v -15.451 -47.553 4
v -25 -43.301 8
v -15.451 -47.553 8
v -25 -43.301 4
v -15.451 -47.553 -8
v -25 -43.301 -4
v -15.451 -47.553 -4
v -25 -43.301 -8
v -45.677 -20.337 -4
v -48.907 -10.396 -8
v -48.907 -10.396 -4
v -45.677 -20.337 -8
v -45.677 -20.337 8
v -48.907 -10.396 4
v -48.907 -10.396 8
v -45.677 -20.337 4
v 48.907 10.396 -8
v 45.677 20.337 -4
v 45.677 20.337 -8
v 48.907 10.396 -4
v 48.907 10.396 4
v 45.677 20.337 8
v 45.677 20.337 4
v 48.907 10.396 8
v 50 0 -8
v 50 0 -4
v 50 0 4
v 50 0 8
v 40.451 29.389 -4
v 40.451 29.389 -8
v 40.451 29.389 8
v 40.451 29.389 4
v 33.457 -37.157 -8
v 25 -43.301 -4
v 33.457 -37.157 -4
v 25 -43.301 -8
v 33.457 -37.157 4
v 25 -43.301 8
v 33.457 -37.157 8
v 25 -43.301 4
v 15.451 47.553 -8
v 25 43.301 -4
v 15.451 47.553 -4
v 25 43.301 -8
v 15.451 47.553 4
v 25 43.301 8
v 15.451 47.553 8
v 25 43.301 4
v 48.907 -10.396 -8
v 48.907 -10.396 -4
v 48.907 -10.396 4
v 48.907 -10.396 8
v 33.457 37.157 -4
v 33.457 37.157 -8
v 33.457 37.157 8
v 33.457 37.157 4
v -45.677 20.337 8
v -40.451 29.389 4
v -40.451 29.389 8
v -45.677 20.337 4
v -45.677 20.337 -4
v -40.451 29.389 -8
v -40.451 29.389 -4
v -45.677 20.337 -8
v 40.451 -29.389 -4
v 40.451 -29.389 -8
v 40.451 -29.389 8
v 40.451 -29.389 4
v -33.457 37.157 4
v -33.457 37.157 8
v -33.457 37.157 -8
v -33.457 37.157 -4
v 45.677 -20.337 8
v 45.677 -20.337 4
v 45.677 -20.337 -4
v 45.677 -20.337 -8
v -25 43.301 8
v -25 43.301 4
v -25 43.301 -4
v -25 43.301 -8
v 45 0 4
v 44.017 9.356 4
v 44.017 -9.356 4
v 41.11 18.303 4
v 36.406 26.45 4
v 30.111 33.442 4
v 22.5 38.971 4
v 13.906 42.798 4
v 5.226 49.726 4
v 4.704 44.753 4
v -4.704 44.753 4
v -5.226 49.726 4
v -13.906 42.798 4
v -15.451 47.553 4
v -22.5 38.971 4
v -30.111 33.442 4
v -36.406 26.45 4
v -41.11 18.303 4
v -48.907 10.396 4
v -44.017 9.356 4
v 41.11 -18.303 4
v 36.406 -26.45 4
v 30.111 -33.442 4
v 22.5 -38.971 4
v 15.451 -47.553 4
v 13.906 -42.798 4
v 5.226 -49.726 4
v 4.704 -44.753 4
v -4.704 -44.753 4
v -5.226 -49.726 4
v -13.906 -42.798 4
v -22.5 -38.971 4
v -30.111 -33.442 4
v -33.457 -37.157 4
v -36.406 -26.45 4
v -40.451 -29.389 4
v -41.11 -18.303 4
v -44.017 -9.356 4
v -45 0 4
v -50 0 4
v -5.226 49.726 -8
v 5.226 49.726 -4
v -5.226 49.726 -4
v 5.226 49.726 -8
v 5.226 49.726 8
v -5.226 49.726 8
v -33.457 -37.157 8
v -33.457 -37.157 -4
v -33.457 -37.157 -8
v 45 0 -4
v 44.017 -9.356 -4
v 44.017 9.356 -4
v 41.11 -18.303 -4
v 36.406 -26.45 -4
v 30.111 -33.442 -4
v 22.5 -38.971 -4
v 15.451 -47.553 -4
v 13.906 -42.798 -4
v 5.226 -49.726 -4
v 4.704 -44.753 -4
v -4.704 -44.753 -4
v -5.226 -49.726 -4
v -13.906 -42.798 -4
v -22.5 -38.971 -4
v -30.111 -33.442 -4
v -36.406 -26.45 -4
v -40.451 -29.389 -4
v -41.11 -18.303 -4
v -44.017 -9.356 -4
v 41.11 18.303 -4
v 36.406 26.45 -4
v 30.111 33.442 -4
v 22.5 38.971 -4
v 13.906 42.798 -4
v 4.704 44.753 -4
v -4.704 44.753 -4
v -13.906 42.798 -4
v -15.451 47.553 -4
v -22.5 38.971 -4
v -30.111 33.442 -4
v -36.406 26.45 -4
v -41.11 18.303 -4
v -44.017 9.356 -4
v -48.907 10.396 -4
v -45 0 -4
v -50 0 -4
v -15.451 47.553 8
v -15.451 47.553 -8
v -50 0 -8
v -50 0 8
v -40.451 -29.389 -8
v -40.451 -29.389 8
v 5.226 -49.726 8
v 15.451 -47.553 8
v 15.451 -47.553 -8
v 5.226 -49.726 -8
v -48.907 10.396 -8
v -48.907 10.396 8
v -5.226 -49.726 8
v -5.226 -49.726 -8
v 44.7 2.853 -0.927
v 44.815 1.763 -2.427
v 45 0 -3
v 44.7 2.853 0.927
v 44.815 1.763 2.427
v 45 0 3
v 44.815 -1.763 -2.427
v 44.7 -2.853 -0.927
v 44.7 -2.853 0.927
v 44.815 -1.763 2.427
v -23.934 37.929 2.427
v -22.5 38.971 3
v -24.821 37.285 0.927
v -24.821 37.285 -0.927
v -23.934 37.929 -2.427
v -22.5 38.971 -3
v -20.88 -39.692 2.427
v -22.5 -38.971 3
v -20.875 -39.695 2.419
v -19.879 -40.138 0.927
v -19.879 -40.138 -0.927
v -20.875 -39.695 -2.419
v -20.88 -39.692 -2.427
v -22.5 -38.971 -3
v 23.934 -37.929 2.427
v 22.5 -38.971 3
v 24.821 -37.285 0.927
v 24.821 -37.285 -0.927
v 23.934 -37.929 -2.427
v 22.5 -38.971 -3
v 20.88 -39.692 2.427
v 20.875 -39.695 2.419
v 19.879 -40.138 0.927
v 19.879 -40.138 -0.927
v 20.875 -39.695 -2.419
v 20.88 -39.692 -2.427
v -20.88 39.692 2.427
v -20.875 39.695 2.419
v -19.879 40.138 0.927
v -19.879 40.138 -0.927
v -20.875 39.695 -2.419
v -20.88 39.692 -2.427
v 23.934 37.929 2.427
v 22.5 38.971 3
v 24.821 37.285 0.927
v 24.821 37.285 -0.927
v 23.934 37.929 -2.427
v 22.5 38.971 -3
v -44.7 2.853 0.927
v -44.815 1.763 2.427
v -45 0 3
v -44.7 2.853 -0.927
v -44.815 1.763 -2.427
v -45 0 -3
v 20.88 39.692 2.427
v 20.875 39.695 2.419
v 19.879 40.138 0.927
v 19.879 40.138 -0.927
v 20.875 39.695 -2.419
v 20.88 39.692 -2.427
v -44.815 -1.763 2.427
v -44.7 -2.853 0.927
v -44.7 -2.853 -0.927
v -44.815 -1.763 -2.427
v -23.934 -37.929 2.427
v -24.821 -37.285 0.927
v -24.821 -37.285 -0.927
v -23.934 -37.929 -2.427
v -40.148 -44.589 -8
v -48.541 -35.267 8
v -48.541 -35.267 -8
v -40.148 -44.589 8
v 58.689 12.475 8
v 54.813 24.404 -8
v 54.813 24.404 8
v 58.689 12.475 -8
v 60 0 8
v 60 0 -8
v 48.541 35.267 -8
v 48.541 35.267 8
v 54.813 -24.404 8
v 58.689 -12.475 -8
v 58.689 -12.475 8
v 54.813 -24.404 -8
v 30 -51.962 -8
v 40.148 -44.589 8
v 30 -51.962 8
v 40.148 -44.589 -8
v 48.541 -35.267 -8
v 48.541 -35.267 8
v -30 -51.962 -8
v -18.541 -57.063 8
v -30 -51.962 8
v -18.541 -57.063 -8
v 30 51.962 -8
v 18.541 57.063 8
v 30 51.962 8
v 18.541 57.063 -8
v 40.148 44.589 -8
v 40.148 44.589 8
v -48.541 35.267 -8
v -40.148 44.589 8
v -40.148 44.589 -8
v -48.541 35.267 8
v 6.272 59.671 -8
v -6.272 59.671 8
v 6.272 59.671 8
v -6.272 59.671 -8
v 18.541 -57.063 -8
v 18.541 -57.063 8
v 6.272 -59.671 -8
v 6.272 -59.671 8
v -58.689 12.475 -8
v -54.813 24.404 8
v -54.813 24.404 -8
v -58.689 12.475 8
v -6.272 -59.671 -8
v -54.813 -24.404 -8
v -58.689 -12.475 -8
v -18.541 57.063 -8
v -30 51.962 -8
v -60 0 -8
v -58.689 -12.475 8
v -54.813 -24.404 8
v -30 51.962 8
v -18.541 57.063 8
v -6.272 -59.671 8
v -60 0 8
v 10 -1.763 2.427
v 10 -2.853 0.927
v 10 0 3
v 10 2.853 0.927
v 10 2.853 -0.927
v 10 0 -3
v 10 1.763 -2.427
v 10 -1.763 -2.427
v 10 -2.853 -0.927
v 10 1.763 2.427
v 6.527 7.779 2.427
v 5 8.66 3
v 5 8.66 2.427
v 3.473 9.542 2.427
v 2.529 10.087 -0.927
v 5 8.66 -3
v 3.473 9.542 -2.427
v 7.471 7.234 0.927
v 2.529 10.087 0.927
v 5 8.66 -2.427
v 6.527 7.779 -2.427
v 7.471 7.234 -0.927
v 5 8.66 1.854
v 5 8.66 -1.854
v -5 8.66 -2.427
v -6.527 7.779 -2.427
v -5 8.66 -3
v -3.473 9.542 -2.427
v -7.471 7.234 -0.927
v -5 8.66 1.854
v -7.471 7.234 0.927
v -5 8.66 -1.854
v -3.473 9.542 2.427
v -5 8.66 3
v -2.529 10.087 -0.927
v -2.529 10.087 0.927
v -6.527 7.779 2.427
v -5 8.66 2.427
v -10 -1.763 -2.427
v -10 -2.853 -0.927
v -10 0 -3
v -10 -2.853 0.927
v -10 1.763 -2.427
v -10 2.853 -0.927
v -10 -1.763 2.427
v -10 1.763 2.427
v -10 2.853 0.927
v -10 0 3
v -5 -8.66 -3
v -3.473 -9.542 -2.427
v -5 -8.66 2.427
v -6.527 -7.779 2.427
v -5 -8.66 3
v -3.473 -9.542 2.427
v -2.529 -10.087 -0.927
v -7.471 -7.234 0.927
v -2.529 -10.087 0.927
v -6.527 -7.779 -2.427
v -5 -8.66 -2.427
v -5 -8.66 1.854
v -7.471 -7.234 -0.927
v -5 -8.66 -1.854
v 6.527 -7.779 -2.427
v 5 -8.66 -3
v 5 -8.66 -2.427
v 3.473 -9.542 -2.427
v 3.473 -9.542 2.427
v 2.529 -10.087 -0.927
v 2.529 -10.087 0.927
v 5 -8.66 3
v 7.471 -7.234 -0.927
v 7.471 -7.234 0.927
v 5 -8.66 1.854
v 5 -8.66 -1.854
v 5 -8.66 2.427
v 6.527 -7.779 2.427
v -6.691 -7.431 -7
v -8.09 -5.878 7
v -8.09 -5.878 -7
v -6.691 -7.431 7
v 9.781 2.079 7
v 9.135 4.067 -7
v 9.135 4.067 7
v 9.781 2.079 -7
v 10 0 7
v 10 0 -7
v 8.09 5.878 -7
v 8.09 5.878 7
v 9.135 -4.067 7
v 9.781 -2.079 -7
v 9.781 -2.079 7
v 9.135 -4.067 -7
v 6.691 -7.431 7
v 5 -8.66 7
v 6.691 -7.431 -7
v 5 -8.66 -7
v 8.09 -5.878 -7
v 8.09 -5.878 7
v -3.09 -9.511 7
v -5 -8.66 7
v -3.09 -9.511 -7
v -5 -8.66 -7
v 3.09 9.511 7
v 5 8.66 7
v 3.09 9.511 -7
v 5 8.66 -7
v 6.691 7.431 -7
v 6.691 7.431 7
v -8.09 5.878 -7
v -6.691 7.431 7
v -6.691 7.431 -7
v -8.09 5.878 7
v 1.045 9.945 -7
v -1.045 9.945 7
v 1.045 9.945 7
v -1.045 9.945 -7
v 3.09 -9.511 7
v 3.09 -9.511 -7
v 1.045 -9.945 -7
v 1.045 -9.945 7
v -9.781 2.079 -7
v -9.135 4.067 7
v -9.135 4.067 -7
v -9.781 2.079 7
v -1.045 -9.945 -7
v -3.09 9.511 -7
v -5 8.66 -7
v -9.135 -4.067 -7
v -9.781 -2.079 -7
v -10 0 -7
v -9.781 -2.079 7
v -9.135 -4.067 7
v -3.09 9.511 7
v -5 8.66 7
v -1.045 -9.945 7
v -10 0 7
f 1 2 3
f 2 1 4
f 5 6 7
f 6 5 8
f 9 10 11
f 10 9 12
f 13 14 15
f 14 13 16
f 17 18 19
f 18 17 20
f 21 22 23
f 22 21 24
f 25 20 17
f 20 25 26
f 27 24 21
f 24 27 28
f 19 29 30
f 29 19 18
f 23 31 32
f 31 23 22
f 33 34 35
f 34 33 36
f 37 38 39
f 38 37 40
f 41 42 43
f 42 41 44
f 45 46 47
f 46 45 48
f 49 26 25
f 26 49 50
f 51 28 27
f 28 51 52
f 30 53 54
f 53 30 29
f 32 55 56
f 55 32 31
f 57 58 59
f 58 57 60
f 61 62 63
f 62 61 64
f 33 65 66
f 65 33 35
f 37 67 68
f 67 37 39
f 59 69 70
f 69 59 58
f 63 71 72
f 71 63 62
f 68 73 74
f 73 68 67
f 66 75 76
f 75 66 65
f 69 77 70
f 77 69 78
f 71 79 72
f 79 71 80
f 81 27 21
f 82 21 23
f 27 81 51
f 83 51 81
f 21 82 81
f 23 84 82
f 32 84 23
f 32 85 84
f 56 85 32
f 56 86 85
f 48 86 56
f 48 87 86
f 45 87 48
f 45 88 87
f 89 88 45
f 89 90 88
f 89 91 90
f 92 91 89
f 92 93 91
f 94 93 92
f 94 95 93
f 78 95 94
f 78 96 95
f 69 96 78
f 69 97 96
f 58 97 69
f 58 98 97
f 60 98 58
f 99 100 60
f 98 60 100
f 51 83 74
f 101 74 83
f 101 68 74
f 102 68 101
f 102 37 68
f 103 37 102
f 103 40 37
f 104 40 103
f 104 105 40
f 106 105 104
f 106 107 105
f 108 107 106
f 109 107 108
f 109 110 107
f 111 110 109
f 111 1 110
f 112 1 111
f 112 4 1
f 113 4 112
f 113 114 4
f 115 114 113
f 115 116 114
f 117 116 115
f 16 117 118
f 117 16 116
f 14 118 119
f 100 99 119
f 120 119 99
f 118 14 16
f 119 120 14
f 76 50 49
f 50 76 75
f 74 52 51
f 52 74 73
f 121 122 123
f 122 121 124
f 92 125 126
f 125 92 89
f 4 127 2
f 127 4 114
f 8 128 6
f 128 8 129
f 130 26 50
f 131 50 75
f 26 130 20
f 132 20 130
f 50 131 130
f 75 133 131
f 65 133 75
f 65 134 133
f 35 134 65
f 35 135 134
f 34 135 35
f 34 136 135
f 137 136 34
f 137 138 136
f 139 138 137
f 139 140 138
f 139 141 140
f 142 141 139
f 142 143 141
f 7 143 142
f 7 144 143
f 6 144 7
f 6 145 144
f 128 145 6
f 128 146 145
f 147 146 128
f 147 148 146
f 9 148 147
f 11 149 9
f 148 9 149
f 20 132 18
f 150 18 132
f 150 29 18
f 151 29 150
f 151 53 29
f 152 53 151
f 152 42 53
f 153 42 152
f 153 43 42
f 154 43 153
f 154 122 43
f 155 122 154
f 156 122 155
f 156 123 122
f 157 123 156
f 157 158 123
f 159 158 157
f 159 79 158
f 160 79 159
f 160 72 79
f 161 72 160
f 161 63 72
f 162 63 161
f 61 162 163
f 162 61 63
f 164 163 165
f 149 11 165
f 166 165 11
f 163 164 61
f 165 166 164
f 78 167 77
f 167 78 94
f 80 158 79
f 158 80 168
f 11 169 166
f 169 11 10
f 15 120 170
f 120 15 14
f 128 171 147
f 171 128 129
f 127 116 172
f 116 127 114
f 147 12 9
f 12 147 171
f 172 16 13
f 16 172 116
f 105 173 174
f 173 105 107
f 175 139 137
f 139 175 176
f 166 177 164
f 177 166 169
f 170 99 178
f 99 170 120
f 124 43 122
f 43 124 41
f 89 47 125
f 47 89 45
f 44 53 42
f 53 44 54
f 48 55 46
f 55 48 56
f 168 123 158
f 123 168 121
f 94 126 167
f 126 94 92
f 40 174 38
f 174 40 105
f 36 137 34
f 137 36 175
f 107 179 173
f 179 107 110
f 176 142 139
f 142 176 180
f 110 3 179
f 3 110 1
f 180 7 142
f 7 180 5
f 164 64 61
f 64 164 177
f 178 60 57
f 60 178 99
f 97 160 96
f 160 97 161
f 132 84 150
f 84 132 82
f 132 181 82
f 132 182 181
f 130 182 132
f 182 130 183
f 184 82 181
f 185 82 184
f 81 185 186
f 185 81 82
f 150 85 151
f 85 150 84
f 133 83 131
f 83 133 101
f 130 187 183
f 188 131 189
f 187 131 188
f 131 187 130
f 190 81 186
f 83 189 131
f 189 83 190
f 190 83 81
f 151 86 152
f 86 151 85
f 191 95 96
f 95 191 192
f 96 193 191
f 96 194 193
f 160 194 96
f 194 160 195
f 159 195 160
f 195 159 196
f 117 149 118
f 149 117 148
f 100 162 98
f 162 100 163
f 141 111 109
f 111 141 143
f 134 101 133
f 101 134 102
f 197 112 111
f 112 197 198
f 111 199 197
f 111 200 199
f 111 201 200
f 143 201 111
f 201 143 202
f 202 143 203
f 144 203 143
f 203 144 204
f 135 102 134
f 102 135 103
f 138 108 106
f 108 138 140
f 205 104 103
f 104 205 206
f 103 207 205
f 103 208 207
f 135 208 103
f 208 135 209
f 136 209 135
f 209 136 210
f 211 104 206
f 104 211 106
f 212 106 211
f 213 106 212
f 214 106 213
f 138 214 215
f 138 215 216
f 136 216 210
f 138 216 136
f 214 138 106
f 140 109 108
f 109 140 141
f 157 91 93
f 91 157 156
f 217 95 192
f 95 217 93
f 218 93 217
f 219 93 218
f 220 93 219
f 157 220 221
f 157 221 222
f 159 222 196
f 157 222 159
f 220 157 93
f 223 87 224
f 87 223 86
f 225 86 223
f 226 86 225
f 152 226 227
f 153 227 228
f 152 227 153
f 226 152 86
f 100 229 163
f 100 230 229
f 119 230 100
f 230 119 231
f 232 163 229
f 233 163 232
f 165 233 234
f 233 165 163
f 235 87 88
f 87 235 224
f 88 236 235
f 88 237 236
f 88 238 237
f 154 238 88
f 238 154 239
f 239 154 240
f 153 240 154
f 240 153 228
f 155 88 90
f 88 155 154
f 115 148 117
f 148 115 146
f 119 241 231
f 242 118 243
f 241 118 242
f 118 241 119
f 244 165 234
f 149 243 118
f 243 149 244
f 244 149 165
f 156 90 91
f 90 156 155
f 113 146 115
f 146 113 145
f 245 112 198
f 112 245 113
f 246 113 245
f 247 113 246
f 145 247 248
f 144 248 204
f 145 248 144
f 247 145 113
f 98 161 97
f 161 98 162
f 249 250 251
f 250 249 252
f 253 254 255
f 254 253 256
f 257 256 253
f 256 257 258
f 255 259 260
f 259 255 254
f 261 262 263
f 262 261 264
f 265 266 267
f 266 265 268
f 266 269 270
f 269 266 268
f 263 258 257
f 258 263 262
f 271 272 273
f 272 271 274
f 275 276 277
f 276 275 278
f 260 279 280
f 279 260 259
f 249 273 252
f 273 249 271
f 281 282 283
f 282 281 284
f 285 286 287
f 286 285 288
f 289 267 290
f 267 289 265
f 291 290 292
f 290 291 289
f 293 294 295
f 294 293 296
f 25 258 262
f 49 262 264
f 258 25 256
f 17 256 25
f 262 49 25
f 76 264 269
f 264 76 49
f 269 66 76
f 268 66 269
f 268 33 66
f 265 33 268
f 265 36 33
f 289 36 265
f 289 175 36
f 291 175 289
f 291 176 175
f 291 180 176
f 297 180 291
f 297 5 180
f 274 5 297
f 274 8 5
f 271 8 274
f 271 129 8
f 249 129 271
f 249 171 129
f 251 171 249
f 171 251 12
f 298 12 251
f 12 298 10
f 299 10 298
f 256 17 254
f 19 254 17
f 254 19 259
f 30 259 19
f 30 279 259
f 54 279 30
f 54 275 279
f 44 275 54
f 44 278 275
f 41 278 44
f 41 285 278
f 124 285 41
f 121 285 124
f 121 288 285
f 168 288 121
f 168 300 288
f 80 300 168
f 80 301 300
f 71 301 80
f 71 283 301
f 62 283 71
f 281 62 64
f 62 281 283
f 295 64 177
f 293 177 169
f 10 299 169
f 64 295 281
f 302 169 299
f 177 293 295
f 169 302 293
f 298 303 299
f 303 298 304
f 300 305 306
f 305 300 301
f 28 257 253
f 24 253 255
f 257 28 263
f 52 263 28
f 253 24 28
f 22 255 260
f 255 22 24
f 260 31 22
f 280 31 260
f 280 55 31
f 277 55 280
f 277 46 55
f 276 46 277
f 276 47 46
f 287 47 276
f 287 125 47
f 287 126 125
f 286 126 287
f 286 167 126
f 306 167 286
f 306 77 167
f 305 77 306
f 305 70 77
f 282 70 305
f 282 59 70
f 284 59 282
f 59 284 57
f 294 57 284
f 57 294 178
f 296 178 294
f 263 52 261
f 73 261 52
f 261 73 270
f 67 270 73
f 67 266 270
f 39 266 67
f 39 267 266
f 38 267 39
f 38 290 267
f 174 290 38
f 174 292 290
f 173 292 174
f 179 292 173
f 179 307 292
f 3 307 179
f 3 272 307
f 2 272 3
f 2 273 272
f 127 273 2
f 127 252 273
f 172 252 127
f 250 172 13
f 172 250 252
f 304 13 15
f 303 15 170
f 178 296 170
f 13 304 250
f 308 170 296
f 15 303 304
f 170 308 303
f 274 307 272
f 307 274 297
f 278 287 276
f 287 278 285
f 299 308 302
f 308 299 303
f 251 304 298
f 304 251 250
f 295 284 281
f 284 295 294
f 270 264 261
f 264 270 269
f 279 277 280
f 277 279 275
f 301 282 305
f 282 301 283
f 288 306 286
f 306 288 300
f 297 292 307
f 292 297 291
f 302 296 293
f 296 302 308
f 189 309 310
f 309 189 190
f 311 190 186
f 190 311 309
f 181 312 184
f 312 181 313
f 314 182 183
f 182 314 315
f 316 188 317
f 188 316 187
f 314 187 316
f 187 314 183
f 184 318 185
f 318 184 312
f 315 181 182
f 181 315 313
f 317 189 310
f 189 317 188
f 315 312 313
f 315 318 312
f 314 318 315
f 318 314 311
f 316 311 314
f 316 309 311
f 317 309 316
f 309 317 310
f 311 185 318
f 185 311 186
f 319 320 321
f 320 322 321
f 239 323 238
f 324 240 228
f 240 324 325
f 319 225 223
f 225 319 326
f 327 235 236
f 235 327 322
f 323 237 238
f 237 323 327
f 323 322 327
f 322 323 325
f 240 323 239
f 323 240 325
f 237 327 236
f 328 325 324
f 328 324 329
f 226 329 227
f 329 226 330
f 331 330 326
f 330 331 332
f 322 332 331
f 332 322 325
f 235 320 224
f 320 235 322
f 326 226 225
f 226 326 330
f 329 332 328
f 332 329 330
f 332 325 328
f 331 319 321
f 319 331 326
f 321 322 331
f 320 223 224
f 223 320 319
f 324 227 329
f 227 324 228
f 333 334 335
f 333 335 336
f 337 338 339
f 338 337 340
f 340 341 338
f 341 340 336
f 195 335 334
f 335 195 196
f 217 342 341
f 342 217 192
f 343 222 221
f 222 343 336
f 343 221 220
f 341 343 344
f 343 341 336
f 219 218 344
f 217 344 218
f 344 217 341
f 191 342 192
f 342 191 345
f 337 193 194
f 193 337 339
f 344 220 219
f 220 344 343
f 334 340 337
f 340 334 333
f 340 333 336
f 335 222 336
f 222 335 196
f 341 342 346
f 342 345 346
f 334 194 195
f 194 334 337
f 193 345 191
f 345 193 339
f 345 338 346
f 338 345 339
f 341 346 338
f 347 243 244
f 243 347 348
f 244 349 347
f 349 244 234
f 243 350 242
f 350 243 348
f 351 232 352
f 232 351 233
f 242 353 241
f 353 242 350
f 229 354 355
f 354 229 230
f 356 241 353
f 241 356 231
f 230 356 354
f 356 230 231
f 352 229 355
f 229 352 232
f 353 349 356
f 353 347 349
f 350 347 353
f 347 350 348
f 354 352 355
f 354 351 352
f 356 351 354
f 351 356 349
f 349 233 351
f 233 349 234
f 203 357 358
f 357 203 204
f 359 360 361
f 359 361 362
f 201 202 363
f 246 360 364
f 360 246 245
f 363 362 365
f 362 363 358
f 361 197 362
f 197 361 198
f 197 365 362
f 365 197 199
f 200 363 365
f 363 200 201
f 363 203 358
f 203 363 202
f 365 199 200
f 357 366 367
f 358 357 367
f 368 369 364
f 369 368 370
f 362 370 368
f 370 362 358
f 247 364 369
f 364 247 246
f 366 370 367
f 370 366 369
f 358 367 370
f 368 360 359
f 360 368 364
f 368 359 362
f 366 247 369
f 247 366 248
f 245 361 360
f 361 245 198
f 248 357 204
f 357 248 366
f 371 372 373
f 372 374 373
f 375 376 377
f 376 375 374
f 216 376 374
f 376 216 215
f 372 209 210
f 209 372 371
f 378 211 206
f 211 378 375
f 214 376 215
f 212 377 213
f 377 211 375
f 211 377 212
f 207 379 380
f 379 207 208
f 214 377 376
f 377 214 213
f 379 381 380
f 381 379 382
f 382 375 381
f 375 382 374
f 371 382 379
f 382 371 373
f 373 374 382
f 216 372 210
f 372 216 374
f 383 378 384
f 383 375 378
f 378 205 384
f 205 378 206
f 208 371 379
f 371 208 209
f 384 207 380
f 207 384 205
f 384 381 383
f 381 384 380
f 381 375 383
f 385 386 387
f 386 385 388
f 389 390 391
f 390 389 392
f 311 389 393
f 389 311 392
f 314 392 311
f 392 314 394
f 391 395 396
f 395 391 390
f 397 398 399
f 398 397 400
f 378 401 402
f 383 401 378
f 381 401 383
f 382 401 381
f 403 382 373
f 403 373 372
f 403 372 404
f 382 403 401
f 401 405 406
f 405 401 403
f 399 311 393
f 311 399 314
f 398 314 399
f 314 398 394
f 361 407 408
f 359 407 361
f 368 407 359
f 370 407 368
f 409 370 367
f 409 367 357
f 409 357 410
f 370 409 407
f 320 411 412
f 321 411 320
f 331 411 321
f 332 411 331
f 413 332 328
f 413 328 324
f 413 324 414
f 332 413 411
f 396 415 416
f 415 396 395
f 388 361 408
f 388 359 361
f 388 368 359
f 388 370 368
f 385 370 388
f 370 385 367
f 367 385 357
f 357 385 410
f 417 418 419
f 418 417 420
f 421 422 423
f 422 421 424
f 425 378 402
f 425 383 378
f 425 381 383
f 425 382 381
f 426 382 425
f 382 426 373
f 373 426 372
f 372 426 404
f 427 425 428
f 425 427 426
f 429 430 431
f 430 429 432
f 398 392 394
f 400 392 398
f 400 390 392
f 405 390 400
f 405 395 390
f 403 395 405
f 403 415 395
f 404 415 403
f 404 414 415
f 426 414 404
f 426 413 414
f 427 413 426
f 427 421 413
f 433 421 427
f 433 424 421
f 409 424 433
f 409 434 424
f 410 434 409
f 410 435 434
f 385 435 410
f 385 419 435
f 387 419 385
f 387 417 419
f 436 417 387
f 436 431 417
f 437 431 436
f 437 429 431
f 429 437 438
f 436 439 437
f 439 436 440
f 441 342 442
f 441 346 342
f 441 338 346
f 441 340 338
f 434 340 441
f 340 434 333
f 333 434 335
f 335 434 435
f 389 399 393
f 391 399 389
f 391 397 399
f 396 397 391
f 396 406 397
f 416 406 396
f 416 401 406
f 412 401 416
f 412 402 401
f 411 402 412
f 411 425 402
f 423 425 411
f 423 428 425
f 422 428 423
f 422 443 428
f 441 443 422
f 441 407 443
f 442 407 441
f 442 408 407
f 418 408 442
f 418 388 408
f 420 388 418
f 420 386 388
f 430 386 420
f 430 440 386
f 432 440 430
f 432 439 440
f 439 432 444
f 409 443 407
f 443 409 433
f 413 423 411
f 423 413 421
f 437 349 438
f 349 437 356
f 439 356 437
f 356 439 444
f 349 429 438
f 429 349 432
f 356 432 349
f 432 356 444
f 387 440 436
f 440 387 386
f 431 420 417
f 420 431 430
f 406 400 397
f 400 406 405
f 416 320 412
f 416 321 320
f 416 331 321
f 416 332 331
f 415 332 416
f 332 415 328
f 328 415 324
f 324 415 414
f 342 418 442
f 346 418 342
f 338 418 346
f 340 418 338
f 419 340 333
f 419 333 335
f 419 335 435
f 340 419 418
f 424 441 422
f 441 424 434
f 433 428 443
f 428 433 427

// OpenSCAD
// 3DScad sample: spoked wheel
// Uses only the currently round-trippable subset.

module scene_model() {
    rim_r = 50;
    rim_h = 8;
    rim_t = 5;
    tire_t = 10;
    tire_w = 16;
    hub_r = 10;
    hub_h = 14;
    spoke_count = 6;
    spoke_r = 3;

    union() {
        cylinder(h=hub_h, r=hub_r, center=true);
        difference() {
            cylinder(h=rim_h, r=rim_r, center=true);
            cylinder(h=rim_h + 2, r=rim_r - rim_t, center=true);
        }
        difference() {
            cylinder(h=tire_w, r=rim_r + tire_t, center=true);
            cylinder(h=tire_w + 2, r=rim_r, center=true);
        }
        for (i = [0 : 1 : spoke_count - 1]) {
            rotate([0, 0, i * 360 / spoke_count]) {
                translate([(hub_r + rim_r - rim_t) / 2, 0, 0]) {
                    rotate([0, 90, 0]) {
                        cylinder(h=rim_r - rim_t - hub_r, r=spoke_r, center=true);
                    }
                }
            }
        }
    }
}

scene_model();
